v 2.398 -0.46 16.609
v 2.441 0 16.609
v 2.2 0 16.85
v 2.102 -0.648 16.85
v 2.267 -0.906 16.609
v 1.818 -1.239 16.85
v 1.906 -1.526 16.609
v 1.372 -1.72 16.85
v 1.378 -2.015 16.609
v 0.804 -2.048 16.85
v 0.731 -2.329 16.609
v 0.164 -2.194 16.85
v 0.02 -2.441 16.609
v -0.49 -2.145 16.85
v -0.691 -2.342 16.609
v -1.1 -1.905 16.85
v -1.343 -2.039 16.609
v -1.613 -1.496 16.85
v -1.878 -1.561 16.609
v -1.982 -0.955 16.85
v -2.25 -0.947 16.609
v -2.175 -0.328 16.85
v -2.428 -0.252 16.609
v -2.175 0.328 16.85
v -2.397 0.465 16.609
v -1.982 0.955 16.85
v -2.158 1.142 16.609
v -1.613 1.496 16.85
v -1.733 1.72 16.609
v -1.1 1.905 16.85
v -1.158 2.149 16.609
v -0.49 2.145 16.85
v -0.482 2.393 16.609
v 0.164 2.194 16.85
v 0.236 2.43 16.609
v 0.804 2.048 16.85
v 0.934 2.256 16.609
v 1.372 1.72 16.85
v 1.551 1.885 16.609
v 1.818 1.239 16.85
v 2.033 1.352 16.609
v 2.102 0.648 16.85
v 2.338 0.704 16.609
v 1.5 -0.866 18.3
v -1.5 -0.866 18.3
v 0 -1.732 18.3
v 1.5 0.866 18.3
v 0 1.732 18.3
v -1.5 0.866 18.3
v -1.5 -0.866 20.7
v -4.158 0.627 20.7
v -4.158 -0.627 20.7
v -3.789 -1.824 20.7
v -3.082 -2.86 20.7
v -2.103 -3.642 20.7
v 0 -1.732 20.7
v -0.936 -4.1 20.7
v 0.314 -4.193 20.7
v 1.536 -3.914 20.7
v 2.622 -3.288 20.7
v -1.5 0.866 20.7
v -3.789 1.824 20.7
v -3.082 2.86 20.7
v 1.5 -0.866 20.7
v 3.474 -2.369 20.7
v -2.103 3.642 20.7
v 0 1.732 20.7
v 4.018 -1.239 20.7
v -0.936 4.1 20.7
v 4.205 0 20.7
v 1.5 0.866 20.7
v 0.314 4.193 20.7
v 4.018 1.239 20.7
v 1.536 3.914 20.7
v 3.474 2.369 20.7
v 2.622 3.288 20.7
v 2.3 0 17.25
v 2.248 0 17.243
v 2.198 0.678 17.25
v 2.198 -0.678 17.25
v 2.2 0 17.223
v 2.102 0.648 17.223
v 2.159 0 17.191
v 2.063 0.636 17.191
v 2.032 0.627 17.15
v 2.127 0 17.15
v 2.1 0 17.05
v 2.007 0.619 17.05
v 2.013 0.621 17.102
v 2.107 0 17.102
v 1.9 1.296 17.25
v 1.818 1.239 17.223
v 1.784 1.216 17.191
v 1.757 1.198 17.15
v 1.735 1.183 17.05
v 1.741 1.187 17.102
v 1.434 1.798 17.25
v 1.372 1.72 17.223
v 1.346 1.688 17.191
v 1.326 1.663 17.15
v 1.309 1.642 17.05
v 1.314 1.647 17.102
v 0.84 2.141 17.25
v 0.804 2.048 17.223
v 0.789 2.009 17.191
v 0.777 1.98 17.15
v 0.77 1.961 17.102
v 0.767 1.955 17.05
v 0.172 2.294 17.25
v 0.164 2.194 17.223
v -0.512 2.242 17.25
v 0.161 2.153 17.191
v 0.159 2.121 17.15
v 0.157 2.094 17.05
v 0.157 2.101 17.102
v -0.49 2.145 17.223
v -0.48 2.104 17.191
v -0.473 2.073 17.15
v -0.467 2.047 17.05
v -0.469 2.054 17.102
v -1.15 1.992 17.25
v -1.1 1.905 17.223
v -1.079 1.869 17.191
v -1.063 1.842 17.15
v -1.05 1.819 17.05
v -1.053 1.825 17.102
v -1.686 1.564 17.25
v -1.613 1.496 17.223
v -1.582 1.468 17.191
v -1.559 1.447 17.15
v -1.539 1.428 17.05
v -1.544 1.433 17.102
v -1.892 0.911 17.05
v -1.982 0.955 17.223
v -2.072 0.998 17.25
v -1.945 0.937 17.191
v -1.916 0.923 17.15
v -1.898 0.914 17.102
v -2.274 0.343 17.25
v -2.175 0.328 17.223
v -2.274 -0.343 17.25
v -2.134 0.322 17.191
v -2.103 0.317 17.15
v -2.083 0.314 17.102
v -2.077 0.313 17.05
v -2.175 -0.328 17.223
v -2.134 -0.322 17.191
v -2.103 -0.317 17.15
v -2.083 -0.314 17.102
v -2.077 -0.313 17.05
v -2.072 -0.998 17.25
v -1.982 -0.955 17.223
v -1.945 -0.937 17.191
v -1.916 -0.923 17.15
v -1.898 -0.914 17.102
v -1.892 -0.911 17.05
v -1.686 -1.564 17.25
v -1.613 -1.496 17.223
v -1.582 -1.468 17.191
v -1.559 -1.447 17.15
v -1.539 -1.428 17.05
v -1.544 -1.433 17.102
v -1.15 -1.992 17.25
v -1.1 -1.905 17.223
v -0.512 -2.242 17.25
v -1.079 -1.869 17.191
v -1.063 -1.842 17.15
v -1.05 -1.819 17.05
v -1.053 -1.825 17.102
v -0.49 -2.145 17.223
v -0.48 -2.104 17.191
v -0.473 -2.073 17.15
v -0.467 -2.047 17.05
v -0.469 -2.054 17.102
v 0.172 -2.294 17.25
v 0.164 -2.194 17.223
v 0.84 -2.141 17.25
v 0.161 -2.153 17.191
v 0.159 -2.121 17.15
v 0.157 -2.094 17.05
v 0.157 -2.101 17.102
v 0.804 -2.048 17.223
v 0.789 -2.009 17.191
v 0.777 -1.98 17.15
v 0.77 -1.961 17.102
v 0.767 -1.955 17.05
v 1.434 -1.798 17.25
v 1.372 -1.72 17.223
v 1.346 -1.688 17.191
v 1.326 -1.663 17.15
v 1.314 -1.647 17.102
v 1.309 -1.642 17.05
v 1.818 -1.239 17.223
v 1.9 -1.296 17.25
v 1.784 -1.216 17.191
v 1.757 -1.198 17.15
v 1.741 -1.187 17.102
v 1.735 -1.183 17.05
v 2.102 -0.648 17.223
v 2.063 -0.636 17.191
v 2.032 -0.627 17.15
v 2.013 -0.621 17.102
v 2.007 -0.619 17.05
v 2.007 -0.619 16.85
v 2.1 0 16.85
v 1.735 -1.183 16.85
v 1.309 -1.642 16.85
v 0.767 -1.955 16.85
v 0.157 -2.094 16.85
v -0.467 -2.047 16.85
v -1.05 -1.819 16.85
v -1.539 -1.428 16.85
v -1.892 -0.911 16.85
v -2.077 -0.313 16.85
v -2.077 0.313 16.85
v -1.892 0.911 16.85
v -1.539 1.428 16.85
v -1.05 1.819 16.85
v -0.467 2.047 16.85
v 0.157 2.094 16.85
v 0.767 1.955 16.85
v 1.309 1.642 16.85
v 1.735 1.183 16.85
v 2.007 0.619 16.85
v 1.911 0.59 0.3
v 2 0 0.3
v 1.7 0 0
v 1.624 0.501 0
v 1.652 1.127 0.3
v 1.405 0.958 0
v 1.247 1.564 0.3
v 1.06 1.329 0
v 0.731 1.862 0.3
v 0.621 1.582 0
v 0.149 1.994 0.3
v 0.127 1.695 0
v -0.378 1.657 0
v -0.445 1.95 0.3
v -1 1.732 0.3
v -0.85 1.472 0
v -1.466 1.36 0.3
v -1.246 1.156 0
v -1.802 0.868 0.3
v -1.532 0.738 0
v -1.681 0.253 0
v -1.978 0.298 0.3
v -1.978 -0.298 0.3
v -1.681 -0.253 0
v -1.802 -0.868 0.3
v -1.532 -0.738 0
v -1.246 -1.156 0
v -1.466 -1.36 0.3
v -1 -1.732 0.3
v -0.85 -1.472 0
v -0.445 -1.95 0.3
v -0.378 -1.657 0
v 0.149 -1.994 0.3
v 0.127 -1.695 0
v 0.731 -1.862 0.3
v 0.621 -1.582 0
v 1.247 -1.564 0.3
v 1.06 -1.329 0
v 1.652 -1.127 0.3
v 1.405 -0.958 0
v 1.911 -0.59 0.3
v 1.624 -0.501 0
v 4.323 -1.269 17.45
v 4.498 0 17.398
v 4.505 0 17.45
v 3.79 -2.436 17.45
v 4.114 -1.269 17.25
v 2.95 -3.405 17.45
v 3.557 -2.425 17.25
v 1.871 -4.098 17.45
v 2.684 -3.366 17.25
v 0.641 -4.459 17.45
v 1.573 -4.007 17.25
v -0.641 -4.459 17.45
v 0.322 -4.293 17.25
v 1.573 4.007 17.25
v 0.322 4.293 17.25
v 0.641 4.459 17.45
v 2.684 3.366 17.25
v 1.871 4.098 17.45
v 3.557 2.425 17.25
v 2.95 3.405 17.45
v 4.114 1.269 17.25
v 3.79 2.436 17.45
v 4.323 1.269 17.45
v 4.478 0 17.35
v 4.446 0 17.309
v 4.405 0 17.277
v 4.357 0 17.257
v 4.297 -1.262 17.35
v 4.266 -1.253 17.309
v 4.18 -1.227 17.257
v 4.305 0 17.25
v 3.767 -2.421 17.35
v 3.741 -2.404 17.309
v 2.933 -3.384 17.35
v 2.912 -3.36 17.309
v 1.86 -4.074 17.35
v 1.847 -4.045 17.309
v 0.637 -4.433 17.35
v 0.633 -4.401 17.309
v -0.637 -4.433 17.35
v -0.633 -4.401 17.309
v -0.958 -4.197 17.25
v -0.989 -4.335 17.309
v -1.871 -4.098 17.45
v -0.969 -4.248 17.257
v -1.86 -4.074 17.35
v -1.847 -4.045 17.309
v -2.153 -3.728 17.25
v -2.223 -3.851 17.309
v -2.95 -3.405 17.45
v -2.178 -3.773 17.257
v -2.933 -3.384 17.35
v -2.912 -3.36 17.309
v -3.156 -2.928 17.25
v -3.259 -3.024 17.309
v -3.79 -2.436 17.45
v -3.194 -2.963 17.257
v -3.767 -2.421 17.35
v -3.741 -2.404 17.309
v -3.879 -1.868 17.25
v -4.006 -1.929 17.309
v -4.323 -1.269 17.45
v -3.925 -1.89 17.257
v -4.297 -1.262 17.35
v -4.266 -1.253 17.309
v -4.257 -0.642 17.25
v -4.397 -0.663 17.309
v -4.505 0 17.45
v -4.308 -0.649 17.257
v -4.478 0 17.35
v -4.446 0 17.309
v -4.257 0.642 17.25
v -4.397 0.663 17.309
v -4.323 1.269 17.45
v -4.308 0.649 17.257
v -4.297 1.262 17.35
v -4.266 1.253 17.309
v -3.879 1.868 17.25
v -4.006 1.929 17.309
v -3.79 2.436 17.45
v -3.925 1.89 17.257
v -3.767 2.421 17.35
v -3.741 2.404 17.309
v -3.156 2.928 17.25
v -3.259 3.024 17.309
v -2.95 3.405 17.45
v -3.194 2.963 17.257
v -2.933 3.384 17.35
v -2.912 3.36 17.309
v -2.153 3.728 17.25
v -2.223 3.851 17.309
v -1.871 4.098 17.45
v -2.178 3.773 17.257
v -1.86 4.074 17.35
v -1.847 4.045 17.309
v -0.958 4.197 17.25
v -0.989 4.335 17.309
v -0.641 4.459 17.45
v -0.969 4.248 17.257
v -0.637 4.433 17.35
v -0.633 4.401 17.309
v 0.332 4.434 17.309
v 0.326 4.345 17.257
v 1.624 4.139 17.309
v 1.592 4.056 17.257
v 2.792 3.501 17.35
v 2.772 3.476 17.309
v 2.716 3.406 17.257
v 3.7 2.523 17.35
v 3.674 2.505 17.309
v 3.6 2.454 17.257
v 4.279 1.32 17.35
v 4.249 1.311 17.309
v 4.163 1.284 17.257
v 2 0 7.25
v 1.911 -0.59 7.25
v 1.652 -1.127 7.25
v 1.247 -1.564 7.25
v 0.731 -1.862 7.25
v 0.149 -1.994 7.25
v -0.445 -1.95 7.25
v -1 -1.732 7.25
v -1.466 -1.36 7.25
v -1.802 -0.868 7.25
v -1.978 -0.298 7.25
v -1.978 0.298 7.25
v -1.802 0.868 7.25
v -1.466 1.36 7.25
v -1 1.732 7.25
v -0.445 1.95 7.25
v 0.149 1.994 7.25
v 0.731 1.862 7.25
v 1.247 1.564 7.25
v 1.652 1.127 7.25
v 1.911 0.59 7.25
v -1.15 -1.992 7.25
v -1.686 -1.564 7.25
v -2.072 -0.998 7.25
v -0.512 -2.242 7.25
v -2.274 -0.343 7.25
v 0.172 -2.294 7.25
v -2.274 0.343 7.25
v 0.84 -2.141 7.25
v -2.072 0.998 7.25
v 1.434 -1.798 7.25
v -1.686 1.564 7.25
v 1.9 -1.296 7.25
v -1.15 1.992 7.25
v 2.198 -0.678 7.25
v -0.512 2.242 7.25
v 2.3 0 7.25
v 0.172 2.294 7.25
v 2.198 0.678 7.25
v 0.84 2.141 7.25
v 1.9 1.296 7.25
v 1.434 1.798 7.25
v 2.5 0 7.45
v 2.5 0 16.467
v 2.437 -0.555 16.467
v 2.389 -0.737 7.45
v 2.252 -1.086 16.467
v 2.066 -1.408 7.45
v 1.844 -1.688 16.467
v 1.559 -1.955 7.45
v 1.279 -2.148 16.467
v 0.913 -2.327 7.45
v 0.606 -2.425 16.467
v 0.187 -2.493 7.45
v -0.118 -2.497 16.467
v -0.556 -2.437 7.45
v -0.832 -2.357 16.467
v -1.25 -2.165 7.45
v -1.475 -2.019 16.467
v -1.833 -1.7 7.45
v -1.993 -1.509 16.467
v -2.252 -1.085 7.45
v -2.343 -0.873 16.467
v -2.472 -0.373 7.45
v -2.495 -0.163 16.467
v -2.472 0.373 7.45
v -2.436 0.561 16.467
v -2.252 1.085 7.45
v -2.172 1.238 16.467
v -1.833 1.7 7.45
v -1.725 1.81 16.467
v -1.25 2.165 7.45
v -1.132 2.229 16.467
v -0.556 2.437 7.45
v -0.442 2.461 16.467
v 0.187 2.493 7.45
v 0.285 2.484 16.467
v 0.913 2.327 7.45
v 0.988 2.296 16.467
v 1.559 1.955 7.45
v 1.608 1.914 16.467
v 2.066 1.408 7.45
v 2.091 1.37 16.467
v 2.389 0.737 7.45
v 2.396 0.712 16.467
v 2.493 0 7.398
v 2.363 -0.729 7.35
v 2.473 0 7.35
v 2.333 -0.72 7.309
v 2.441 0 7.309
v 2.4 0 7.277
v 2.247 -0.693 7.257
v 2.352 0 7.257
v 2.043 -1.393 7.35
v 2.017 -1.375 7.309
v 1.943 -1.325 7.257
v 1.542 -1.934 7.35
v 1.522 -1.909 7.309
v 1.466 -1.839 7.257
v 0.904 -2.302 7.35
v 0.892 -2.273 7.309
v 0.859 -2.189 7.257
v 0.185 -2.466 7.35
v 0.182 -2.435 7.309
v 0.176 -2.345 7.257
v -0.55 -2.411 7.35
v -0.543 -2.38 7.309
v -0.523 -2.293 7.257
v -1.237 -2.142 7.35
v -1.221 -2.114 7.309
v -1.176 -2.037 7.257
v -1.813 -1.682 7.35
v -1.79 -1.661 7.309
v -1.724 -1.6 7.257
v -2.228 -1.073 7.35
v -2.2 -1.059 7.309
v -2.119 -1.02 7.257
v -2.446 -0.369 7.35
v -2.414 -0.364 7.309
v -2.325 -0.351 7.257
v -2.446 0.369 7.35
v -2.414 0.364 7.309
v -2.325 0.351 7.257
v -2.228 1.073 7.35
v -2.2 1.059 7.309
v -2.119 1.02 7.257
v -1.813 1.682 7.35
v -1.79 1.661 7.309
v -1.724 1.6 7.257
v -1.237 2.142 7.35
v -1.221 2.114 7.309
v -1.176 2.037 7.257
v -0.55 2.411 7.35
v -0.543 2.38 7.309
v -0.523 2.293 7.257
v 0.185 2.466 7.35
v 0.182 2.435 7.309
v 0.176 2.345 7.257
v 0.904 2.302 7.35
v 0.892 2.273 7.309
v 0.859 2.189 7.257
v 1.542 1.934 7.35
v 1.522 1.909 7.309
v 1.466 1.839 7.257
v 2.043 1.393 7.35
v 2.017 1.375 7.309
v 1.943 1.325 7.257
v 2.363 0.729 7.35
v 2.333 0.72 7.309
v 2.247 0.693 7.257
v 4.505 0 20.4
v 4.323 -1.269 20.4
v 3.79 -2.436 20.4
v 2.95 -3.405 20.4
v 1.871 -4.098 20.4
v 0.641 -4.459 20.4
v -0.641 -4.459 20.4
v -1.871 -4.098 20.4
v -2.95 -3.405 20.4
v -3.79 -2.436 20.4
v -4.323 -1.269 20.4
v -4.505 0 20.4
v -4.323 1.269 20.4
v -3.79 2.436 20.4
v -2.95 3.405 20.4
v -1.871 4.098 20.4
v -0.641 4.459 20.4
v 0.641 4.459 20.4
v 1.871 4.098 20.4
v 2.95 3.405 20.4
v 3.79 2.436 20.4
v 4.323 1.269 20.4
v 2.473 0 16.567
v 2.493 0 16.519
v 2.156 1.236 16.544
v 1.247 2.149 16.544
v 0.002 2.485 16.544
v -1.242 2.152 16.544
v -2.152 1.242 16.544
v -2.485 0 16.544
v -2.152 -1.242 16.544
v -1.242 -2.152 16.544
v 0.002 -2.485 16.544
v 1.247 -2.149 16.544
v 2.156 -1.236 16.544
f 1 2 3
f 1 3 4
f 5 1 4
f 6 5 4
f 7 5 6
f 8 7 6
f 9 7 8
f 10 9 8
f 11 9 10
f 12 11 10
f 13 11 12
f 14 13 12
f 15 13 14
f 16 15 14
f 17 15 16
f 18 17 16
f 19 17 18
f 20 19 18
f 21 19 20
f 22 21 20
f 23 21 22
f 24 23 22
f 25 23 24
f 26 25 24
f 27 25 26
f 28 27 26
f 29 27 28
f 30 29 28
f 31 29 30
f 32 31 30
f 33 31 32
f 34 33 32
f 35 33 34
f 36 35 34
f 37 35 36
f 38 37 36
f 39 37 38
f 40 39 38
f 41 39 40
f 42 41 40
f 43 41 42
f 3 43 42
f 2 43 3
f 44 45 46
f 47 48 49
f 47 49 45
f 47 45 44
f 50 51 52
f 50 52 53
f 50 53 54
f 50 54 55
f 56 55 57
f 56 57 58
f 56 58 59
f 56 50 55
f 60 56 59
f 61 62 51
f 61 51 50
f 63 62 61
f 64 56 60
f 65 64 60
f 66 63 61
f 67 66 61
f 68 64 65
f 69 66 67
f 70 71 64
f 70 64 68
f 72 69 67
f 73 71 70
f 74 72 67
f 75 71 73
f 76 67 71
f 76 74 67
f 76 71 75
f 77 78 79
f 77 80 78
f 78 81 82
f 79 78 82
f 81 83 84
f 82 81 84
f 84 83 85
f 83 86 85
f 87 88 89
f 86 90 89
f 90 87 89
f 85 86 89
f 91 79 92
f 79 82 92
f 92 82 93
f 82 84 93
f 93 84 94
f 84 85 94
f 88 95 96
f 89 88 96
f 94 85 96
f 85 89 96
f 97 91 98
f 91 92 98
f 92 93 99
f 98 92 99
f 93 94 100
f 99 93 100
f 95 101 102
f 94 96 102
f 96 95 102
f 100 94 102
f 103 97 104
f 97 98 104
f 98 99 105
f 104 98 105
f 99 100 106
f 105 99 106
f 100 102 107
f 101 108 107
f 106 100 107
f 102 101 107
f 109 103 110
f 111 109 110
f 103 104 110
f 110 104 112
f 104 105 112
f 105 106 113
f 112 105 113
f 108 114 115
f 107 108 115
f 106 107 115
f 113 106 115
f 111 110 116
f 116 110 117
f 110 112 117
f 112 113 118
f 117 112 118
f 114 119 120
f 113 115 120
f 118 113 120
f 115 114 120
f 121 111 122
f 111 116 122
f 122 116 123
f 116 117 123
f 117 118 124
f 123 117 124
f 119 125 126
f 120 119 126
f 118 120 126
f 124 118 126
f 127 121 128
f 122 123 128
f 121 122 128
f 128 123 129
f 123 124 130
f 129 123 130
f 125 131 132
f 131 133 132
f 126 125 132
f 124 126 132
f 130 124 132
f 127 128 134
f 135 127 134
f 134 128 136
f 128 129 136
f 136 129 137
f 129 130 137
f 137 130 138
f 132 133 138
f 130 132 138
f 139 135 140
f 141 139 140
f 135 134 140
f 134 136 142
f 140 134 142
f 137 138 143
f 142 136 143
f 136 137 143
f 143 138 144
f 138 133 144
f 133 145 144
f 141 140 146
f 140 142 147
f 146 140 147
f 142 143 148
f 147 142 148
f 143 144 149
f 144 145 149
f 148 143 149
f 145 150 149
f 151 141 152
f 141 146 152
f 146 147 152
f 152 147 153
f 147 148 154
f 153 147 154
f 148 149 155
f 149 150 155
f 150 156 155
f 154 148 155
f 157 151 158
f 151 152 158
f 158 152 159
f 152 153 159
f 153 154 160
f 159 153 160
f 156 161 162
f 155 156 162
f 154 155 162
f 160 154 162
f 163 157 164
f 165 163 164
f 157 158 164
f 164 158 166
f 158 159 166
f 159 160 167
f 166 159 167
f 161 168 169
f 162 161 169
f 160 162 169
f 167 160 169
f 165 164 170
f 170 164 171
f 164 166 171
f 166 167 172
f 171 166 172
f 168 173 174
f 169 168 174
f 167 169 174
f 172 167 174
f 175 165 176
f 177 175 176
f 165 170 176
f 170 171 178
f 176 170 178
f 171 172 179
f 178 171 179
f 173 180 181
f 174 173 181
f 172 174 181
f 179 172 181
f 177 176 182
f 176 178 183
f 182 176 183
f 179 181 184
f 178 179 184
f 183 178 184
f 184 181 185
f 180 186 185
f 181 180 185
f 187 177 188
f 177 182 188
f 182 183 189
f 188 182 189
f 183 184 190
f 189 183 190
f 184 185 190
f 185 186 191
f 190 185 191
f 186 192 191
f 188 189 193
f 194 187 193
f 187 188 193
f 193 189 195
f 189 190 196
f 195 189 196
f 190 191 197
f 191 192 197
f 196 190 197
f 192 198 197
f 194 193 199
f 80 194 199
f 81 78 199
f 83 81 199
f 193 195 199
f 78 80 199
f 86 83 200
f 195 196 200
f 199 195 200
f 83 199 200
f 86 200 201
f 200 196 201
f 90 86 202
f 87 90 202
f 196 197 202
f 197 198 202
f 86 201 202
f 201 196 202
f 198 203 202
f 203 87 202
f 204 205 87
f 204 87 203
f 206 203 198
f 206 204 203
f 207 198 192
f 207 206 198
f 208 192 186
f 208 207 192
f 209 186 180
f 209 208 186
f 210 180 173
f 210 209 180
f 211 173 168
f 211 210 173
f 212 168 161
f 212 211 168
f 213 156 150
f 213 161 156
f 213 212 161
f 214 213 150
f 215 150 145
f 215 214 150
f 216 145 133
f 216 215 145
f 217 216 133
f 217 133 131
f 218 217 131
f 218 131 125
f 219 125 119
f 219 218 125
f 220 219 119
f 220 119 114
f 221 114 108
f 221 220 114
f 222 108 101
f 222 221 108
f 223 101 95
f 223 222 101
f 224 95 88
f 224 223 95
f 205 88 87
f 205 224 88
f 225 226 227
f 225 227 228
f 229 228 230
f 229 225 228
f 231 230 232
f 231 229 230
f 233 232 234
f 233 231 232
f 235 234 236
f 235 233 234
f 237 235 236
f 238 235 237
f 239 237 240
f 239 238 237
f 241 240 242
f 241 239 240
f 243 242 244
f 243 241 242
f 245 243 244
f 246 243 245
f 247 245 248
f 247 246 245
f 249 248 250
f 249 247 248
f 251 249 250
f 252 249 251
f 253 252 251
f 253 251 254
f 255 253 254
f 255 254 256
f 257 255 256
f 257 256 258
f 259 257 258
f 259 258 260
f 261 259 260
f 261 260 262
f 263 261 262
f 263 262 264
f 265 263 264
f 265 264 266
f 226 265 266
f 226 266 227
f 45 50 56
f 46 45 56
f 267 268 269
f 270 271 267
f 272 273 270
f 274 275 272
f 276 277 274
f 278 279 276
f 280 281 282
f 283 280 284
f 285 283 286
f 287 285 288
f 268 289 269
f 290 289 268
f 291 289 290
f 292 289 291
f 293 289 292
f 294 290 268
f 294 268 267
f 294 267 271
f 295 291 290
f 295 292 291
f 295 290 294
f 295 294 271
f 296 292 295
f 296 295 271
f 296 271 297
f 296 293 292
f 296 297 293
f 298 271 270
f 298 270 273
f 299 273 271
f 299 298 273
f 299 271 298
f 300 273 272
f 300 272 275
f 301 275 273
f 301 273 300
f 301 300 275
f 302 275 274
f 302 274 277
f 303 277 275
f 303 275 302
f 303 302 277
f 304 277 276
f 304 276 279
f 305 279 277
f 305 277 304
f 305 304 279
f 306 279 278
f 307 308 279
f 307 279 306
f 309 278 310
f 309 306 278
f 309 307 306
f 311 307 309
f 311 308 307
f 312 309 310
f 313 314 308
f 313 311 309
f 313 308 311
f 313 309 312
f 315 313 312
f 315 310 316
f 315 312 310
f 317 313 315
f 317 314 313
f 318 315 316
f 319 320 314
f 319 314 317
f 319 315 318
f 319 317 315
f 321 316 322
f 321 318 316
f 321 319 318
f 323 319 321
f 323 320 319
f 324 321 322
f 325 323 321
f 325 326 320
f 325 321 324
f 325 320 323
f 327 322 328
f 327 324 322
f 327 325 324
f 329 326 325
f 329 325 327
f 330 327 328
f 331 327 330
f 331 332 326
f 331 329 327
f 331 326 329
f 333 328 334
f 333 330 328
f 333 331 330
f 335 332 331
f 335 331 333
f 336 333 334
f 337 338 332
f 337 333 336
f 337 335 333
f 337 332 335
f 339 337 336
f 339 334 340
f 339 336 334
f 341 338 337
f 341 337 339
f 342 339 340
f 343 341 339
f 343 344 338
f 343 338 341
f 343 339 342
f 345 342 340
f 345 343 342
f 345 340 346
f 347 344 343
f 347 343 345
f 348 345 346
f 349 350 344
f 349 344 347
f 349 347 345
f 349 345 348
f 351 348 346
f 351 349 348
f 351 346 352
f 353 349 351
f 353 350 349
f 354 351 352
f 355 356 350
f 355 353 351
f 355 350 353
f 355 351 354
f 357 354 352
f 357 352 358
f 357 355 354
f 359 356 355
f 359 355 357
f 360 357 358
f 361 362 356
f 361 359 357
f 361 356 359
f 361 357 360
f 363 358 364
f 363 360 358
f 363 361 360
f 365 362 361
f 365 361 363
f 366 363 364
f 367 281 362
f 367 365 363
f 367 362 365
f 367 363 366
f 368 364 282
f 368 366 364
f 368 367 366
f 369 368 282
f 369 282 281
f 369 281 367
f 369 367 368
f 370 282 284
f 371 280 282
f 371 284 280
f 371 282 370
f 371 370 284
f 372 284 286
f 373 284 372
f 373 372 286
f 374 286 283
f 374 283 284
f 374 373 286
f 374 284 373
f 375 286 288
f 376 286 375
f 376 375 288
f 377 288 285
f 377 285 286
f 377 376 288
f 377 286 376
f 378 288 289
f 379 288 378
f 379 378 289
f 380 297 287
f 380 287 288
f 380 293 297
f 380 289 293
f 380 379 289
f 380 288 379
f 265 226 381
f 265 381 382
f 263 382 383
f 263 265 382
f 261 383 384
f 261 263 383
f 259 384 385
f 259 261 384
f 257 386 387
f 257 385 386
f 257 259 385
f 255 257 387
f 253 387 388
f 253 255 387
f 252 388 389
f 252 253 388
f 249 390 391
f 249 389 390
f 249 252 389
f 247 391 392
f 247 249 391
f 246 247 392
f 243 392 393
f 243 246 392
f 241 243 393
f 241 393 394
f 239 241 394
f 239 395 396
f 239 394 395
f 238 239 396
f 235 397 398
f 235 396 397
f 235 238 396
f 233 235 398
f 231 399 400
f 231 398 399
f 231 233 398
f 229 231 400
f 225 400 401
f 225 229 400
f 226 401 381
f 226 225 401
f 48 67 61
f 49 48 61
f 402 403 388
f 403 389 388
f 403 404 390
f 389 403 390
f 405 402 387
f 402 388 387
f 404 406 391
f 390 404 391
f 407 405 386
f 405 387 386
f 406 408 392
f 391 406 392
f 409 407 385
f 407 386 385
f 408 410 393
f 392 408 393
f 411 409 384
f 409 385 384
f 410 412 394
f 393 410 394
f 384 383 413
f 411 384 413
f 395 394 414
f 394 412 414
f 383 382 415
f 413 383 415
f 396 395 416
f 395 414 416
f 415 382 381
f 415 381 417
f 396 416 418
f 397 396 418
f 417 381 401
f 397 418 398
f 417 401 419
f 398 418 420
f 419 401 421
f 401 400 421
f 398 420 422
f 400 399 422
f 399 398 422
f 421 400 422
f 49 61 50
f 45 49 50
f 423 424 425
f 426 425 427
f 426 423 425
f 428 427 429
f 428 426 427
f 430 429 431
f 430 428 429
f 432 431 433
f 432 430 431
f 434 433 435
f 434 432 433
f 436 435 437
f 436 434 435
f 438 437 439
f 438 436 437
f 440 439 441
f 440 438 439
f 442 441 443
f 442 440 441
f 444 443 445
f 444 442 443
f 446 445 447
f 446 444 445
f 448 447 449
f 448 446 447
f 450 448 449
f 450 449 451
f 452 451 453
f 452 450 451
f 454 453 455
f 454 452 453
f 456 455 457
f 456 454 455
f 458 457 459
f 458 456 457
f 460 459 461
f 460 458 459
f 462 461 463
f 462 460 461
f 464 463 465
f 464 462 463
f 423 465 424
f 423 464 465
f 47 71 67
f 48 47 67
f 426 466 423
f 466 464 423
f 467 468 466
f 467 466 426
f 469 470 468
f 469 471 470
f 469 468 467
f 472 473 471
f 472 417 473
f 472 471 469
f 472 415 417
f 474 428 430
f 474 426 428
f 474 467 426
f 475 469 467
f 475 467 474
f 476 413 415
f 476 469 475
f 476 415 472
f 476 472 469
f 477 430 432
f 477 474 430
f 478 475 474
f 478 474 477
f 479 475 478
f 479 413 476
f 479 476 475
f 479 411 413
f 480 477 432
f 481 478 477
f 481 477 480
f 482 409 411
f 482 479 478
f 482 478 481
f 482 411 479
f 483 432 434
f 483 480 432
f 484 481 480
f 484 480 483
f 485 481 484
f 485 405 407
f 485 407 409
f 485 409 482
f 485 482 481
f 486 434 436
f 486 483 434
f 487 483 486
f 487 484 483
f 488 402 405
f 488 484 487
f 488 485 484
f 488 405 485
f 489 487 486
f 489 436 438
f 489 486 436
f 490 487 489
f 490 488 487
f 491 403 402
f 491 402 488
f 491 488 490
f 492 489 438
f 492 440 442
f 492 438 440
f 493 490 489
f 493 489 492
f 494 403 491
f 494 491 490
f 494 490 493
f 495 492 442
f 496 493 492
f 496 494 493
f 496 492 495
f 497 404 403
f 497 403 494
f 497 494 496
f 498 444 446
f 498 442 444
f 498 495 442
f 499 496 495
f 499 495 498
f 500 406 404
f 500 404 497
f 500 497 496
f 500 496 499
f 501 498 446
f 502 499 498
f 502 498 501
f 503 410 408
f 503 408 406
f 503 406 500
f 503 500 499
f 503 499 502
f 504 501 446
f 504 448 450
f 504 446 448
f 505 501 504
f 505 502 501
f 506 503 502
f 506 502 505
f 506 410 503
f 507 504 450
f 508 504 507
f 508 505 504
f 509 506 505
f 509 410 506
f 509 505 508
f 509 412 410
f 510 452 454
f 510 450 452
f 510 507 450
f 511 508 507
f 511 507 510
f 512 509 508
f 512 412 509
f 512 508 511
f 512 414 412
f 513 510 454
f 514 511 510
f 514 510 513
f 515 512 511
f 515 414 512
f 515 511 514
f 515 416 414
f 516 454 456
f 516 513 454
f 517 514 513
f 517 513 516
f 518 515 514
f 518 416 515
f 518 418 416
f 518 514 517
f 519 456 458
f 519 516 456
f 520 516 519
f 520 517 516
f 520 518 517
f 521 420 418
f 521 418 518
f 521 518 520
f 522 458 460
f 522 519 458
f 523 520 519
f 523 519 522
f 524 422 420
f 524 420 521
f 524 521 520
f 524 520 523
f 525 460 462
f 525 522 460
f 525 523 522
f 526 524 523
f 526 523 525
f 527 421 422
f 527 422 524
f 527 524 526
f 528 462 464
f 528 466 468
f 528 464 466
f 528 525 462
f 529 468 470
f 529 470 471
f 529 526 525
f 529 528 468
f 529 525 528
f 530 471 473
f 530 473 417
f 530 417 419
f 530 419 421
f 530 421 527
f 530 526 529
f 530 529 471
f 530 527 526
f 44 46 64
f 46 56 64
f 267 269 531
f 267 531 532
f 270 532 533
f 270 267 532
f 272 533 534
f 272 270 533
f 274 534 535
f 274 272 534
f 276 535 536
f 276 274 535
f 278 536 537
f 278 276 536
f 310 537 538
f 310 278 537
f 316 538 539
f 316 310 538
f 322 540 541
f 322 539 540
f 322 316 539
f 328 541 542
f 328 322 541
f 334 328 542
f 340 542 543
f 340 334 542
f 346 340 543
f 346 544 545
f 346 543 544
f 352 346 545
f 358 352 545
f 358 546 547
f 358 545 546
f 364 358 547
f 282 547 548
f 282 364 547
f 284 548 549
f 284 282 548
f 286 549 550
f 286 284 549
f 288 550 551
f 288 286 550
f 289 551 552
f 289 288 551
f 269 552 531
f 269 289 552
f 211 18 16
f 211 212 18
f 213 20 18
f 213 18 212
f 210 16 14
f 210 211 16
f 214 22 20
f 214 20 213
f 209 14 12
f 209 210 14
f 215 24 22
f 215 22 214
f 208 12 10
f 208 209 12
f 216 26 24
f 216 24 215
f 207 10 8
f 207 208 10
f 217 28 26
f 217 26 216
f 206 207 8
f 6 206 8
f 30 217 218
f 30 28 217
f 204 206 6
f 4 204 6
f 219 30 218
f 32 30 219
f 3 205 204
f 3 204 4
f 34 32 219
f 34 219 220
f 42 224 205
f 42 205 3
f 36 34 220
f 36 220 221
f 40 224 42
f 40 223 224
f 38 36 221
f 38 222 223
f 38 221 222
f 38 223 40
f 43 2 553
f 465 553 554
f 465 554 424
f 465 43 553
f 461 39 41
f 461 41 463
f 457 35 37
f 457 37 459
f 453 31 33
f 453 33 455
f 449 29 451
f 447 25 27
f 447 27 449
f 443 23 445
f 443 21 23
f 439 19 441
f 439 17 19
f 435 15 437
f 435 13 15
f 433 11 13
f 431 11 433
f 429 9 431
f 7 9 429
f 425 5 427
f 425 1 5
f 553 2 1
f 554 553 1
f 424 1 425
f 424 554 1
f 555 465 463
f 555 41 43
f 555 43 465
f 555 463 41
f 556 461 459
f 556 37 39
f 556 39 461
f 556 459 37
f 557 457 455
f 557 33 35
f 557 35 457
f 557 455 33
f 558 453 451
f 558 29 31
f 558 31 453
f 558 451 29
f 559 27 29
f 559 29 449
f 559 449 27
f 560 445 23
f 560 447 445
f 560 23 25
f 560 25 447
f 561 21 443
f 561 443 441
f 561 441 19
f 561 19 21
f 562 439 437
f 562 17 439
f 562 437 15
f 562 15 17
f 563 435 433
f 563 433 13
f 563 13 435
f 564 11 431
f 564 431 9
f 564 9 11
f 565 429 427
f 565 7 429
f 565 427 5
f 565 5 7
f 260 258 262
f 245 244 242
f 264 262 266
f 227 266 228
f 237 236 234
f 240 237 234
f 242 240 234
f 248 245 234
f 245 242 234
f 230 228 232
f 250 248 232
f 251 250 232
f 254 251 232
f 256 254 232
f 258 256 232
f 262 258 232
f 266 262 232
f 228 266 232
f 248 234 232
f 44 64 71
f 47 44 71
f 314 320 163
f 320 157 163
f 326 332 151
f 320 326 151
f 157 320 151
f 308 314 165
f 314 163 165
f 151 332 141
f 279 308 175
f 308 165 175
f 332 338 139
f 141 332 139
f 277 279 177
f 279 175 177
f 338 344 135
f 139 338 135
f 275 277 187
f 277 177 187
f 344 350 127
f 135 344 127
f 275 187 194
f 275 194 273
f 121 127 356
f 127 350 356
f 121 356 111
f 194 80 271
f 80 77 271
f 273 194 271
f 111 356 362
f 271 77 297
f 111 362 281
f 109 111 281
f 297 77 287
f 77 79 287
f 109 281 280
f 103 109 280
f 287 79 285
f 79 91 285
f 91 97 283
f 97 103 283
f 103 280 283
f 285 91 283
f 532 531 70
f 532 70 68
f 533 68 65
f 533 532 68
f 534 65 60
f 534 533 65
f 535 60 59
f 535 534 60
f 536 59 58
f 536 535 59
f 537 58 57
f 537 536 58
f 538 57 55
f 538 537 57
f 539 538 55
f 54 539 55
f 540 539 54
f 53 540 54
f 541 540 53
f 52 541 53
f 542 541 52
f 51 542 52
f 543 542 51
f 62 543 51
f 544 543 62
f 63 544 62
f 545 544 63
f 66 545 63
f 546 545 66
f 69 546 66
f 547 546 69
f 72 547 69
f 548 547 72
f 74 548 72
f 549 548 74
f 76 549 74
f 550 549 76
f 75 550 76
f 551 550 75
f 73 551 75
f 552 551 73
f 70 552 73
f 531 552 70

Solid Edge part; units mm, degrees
sketch "Sketch1" plane through (0, 0, 0) normal (0, -1, 0) x (1, 0, 0)
  line L0 (0, 20.7) -> (4.505, 20.7)
  line L1 (4.505, 20.7) -> (4.505, 17.25)
  line L2 (4.505, 17.25) -> (2.1, 17.25)
  line L3 (2.1, 17.25) -> (2.1, 16.85)
  line L4 (2.1, 16.85) -> (2.5, 16.85)
  line L5 (2.5, 16.85) -> (2.5, 7.25)
  line L6 (2.5, 7.25) -> (2, 7.25)
  line L7 (2, 7.25) -> (2, 0)
  line L8 (2, 0) -> (0, 0)
  dimension "D1" = 4.505
  dimension "D2" = 3.45
  dimension "D3" = 10
  dimension "D4" = 0.4
  dimension "D5" = 7.25
  dimension "D6" = 2.5
  dimension "D7" = 2
revolve "RevolvedProtrusion1" add sketch "Sketch1" angle 360 about axis through (0, 0, 0) along (0, 0, 1)
chamfer "Chamfer1" distance 0.3 angle 45 3 edges at (-2.5, 0, 16.85) (-4.505, 0, 20.7) (-2, 0, 0)
fillet "Round_1" radius 0.2 4 edges at (-4.505, 0, 17.25) (-2.1, 0, 17.25) (-2.5, 0, 7.25) (-2.5, 0, 16.55)
sketch "Sketch2" plane through (0, 0, 20.7) normal (0, 0, 1) x (1, 0, 0)
  line L0 (1.5, 0.866) -> (0, 1.7321)
  line L1 (0, 1.7321) -> (-1.5, 0.866)
  line L2 (-1.5, 0.866) -> (-1.5, -0.866)
  line L3 (-1.5, -0.866) -> (0, -1.7321)
  line L4 (0, -1.7321) -> (1.5, -0.866)
  line L5 (1.5, -0.866) -> (1.5, 0.866)
  dimension "D1" = 3
extrude "ExtrudedCutout_1" cut sketch "Sketch2" against normal blind 2.4
